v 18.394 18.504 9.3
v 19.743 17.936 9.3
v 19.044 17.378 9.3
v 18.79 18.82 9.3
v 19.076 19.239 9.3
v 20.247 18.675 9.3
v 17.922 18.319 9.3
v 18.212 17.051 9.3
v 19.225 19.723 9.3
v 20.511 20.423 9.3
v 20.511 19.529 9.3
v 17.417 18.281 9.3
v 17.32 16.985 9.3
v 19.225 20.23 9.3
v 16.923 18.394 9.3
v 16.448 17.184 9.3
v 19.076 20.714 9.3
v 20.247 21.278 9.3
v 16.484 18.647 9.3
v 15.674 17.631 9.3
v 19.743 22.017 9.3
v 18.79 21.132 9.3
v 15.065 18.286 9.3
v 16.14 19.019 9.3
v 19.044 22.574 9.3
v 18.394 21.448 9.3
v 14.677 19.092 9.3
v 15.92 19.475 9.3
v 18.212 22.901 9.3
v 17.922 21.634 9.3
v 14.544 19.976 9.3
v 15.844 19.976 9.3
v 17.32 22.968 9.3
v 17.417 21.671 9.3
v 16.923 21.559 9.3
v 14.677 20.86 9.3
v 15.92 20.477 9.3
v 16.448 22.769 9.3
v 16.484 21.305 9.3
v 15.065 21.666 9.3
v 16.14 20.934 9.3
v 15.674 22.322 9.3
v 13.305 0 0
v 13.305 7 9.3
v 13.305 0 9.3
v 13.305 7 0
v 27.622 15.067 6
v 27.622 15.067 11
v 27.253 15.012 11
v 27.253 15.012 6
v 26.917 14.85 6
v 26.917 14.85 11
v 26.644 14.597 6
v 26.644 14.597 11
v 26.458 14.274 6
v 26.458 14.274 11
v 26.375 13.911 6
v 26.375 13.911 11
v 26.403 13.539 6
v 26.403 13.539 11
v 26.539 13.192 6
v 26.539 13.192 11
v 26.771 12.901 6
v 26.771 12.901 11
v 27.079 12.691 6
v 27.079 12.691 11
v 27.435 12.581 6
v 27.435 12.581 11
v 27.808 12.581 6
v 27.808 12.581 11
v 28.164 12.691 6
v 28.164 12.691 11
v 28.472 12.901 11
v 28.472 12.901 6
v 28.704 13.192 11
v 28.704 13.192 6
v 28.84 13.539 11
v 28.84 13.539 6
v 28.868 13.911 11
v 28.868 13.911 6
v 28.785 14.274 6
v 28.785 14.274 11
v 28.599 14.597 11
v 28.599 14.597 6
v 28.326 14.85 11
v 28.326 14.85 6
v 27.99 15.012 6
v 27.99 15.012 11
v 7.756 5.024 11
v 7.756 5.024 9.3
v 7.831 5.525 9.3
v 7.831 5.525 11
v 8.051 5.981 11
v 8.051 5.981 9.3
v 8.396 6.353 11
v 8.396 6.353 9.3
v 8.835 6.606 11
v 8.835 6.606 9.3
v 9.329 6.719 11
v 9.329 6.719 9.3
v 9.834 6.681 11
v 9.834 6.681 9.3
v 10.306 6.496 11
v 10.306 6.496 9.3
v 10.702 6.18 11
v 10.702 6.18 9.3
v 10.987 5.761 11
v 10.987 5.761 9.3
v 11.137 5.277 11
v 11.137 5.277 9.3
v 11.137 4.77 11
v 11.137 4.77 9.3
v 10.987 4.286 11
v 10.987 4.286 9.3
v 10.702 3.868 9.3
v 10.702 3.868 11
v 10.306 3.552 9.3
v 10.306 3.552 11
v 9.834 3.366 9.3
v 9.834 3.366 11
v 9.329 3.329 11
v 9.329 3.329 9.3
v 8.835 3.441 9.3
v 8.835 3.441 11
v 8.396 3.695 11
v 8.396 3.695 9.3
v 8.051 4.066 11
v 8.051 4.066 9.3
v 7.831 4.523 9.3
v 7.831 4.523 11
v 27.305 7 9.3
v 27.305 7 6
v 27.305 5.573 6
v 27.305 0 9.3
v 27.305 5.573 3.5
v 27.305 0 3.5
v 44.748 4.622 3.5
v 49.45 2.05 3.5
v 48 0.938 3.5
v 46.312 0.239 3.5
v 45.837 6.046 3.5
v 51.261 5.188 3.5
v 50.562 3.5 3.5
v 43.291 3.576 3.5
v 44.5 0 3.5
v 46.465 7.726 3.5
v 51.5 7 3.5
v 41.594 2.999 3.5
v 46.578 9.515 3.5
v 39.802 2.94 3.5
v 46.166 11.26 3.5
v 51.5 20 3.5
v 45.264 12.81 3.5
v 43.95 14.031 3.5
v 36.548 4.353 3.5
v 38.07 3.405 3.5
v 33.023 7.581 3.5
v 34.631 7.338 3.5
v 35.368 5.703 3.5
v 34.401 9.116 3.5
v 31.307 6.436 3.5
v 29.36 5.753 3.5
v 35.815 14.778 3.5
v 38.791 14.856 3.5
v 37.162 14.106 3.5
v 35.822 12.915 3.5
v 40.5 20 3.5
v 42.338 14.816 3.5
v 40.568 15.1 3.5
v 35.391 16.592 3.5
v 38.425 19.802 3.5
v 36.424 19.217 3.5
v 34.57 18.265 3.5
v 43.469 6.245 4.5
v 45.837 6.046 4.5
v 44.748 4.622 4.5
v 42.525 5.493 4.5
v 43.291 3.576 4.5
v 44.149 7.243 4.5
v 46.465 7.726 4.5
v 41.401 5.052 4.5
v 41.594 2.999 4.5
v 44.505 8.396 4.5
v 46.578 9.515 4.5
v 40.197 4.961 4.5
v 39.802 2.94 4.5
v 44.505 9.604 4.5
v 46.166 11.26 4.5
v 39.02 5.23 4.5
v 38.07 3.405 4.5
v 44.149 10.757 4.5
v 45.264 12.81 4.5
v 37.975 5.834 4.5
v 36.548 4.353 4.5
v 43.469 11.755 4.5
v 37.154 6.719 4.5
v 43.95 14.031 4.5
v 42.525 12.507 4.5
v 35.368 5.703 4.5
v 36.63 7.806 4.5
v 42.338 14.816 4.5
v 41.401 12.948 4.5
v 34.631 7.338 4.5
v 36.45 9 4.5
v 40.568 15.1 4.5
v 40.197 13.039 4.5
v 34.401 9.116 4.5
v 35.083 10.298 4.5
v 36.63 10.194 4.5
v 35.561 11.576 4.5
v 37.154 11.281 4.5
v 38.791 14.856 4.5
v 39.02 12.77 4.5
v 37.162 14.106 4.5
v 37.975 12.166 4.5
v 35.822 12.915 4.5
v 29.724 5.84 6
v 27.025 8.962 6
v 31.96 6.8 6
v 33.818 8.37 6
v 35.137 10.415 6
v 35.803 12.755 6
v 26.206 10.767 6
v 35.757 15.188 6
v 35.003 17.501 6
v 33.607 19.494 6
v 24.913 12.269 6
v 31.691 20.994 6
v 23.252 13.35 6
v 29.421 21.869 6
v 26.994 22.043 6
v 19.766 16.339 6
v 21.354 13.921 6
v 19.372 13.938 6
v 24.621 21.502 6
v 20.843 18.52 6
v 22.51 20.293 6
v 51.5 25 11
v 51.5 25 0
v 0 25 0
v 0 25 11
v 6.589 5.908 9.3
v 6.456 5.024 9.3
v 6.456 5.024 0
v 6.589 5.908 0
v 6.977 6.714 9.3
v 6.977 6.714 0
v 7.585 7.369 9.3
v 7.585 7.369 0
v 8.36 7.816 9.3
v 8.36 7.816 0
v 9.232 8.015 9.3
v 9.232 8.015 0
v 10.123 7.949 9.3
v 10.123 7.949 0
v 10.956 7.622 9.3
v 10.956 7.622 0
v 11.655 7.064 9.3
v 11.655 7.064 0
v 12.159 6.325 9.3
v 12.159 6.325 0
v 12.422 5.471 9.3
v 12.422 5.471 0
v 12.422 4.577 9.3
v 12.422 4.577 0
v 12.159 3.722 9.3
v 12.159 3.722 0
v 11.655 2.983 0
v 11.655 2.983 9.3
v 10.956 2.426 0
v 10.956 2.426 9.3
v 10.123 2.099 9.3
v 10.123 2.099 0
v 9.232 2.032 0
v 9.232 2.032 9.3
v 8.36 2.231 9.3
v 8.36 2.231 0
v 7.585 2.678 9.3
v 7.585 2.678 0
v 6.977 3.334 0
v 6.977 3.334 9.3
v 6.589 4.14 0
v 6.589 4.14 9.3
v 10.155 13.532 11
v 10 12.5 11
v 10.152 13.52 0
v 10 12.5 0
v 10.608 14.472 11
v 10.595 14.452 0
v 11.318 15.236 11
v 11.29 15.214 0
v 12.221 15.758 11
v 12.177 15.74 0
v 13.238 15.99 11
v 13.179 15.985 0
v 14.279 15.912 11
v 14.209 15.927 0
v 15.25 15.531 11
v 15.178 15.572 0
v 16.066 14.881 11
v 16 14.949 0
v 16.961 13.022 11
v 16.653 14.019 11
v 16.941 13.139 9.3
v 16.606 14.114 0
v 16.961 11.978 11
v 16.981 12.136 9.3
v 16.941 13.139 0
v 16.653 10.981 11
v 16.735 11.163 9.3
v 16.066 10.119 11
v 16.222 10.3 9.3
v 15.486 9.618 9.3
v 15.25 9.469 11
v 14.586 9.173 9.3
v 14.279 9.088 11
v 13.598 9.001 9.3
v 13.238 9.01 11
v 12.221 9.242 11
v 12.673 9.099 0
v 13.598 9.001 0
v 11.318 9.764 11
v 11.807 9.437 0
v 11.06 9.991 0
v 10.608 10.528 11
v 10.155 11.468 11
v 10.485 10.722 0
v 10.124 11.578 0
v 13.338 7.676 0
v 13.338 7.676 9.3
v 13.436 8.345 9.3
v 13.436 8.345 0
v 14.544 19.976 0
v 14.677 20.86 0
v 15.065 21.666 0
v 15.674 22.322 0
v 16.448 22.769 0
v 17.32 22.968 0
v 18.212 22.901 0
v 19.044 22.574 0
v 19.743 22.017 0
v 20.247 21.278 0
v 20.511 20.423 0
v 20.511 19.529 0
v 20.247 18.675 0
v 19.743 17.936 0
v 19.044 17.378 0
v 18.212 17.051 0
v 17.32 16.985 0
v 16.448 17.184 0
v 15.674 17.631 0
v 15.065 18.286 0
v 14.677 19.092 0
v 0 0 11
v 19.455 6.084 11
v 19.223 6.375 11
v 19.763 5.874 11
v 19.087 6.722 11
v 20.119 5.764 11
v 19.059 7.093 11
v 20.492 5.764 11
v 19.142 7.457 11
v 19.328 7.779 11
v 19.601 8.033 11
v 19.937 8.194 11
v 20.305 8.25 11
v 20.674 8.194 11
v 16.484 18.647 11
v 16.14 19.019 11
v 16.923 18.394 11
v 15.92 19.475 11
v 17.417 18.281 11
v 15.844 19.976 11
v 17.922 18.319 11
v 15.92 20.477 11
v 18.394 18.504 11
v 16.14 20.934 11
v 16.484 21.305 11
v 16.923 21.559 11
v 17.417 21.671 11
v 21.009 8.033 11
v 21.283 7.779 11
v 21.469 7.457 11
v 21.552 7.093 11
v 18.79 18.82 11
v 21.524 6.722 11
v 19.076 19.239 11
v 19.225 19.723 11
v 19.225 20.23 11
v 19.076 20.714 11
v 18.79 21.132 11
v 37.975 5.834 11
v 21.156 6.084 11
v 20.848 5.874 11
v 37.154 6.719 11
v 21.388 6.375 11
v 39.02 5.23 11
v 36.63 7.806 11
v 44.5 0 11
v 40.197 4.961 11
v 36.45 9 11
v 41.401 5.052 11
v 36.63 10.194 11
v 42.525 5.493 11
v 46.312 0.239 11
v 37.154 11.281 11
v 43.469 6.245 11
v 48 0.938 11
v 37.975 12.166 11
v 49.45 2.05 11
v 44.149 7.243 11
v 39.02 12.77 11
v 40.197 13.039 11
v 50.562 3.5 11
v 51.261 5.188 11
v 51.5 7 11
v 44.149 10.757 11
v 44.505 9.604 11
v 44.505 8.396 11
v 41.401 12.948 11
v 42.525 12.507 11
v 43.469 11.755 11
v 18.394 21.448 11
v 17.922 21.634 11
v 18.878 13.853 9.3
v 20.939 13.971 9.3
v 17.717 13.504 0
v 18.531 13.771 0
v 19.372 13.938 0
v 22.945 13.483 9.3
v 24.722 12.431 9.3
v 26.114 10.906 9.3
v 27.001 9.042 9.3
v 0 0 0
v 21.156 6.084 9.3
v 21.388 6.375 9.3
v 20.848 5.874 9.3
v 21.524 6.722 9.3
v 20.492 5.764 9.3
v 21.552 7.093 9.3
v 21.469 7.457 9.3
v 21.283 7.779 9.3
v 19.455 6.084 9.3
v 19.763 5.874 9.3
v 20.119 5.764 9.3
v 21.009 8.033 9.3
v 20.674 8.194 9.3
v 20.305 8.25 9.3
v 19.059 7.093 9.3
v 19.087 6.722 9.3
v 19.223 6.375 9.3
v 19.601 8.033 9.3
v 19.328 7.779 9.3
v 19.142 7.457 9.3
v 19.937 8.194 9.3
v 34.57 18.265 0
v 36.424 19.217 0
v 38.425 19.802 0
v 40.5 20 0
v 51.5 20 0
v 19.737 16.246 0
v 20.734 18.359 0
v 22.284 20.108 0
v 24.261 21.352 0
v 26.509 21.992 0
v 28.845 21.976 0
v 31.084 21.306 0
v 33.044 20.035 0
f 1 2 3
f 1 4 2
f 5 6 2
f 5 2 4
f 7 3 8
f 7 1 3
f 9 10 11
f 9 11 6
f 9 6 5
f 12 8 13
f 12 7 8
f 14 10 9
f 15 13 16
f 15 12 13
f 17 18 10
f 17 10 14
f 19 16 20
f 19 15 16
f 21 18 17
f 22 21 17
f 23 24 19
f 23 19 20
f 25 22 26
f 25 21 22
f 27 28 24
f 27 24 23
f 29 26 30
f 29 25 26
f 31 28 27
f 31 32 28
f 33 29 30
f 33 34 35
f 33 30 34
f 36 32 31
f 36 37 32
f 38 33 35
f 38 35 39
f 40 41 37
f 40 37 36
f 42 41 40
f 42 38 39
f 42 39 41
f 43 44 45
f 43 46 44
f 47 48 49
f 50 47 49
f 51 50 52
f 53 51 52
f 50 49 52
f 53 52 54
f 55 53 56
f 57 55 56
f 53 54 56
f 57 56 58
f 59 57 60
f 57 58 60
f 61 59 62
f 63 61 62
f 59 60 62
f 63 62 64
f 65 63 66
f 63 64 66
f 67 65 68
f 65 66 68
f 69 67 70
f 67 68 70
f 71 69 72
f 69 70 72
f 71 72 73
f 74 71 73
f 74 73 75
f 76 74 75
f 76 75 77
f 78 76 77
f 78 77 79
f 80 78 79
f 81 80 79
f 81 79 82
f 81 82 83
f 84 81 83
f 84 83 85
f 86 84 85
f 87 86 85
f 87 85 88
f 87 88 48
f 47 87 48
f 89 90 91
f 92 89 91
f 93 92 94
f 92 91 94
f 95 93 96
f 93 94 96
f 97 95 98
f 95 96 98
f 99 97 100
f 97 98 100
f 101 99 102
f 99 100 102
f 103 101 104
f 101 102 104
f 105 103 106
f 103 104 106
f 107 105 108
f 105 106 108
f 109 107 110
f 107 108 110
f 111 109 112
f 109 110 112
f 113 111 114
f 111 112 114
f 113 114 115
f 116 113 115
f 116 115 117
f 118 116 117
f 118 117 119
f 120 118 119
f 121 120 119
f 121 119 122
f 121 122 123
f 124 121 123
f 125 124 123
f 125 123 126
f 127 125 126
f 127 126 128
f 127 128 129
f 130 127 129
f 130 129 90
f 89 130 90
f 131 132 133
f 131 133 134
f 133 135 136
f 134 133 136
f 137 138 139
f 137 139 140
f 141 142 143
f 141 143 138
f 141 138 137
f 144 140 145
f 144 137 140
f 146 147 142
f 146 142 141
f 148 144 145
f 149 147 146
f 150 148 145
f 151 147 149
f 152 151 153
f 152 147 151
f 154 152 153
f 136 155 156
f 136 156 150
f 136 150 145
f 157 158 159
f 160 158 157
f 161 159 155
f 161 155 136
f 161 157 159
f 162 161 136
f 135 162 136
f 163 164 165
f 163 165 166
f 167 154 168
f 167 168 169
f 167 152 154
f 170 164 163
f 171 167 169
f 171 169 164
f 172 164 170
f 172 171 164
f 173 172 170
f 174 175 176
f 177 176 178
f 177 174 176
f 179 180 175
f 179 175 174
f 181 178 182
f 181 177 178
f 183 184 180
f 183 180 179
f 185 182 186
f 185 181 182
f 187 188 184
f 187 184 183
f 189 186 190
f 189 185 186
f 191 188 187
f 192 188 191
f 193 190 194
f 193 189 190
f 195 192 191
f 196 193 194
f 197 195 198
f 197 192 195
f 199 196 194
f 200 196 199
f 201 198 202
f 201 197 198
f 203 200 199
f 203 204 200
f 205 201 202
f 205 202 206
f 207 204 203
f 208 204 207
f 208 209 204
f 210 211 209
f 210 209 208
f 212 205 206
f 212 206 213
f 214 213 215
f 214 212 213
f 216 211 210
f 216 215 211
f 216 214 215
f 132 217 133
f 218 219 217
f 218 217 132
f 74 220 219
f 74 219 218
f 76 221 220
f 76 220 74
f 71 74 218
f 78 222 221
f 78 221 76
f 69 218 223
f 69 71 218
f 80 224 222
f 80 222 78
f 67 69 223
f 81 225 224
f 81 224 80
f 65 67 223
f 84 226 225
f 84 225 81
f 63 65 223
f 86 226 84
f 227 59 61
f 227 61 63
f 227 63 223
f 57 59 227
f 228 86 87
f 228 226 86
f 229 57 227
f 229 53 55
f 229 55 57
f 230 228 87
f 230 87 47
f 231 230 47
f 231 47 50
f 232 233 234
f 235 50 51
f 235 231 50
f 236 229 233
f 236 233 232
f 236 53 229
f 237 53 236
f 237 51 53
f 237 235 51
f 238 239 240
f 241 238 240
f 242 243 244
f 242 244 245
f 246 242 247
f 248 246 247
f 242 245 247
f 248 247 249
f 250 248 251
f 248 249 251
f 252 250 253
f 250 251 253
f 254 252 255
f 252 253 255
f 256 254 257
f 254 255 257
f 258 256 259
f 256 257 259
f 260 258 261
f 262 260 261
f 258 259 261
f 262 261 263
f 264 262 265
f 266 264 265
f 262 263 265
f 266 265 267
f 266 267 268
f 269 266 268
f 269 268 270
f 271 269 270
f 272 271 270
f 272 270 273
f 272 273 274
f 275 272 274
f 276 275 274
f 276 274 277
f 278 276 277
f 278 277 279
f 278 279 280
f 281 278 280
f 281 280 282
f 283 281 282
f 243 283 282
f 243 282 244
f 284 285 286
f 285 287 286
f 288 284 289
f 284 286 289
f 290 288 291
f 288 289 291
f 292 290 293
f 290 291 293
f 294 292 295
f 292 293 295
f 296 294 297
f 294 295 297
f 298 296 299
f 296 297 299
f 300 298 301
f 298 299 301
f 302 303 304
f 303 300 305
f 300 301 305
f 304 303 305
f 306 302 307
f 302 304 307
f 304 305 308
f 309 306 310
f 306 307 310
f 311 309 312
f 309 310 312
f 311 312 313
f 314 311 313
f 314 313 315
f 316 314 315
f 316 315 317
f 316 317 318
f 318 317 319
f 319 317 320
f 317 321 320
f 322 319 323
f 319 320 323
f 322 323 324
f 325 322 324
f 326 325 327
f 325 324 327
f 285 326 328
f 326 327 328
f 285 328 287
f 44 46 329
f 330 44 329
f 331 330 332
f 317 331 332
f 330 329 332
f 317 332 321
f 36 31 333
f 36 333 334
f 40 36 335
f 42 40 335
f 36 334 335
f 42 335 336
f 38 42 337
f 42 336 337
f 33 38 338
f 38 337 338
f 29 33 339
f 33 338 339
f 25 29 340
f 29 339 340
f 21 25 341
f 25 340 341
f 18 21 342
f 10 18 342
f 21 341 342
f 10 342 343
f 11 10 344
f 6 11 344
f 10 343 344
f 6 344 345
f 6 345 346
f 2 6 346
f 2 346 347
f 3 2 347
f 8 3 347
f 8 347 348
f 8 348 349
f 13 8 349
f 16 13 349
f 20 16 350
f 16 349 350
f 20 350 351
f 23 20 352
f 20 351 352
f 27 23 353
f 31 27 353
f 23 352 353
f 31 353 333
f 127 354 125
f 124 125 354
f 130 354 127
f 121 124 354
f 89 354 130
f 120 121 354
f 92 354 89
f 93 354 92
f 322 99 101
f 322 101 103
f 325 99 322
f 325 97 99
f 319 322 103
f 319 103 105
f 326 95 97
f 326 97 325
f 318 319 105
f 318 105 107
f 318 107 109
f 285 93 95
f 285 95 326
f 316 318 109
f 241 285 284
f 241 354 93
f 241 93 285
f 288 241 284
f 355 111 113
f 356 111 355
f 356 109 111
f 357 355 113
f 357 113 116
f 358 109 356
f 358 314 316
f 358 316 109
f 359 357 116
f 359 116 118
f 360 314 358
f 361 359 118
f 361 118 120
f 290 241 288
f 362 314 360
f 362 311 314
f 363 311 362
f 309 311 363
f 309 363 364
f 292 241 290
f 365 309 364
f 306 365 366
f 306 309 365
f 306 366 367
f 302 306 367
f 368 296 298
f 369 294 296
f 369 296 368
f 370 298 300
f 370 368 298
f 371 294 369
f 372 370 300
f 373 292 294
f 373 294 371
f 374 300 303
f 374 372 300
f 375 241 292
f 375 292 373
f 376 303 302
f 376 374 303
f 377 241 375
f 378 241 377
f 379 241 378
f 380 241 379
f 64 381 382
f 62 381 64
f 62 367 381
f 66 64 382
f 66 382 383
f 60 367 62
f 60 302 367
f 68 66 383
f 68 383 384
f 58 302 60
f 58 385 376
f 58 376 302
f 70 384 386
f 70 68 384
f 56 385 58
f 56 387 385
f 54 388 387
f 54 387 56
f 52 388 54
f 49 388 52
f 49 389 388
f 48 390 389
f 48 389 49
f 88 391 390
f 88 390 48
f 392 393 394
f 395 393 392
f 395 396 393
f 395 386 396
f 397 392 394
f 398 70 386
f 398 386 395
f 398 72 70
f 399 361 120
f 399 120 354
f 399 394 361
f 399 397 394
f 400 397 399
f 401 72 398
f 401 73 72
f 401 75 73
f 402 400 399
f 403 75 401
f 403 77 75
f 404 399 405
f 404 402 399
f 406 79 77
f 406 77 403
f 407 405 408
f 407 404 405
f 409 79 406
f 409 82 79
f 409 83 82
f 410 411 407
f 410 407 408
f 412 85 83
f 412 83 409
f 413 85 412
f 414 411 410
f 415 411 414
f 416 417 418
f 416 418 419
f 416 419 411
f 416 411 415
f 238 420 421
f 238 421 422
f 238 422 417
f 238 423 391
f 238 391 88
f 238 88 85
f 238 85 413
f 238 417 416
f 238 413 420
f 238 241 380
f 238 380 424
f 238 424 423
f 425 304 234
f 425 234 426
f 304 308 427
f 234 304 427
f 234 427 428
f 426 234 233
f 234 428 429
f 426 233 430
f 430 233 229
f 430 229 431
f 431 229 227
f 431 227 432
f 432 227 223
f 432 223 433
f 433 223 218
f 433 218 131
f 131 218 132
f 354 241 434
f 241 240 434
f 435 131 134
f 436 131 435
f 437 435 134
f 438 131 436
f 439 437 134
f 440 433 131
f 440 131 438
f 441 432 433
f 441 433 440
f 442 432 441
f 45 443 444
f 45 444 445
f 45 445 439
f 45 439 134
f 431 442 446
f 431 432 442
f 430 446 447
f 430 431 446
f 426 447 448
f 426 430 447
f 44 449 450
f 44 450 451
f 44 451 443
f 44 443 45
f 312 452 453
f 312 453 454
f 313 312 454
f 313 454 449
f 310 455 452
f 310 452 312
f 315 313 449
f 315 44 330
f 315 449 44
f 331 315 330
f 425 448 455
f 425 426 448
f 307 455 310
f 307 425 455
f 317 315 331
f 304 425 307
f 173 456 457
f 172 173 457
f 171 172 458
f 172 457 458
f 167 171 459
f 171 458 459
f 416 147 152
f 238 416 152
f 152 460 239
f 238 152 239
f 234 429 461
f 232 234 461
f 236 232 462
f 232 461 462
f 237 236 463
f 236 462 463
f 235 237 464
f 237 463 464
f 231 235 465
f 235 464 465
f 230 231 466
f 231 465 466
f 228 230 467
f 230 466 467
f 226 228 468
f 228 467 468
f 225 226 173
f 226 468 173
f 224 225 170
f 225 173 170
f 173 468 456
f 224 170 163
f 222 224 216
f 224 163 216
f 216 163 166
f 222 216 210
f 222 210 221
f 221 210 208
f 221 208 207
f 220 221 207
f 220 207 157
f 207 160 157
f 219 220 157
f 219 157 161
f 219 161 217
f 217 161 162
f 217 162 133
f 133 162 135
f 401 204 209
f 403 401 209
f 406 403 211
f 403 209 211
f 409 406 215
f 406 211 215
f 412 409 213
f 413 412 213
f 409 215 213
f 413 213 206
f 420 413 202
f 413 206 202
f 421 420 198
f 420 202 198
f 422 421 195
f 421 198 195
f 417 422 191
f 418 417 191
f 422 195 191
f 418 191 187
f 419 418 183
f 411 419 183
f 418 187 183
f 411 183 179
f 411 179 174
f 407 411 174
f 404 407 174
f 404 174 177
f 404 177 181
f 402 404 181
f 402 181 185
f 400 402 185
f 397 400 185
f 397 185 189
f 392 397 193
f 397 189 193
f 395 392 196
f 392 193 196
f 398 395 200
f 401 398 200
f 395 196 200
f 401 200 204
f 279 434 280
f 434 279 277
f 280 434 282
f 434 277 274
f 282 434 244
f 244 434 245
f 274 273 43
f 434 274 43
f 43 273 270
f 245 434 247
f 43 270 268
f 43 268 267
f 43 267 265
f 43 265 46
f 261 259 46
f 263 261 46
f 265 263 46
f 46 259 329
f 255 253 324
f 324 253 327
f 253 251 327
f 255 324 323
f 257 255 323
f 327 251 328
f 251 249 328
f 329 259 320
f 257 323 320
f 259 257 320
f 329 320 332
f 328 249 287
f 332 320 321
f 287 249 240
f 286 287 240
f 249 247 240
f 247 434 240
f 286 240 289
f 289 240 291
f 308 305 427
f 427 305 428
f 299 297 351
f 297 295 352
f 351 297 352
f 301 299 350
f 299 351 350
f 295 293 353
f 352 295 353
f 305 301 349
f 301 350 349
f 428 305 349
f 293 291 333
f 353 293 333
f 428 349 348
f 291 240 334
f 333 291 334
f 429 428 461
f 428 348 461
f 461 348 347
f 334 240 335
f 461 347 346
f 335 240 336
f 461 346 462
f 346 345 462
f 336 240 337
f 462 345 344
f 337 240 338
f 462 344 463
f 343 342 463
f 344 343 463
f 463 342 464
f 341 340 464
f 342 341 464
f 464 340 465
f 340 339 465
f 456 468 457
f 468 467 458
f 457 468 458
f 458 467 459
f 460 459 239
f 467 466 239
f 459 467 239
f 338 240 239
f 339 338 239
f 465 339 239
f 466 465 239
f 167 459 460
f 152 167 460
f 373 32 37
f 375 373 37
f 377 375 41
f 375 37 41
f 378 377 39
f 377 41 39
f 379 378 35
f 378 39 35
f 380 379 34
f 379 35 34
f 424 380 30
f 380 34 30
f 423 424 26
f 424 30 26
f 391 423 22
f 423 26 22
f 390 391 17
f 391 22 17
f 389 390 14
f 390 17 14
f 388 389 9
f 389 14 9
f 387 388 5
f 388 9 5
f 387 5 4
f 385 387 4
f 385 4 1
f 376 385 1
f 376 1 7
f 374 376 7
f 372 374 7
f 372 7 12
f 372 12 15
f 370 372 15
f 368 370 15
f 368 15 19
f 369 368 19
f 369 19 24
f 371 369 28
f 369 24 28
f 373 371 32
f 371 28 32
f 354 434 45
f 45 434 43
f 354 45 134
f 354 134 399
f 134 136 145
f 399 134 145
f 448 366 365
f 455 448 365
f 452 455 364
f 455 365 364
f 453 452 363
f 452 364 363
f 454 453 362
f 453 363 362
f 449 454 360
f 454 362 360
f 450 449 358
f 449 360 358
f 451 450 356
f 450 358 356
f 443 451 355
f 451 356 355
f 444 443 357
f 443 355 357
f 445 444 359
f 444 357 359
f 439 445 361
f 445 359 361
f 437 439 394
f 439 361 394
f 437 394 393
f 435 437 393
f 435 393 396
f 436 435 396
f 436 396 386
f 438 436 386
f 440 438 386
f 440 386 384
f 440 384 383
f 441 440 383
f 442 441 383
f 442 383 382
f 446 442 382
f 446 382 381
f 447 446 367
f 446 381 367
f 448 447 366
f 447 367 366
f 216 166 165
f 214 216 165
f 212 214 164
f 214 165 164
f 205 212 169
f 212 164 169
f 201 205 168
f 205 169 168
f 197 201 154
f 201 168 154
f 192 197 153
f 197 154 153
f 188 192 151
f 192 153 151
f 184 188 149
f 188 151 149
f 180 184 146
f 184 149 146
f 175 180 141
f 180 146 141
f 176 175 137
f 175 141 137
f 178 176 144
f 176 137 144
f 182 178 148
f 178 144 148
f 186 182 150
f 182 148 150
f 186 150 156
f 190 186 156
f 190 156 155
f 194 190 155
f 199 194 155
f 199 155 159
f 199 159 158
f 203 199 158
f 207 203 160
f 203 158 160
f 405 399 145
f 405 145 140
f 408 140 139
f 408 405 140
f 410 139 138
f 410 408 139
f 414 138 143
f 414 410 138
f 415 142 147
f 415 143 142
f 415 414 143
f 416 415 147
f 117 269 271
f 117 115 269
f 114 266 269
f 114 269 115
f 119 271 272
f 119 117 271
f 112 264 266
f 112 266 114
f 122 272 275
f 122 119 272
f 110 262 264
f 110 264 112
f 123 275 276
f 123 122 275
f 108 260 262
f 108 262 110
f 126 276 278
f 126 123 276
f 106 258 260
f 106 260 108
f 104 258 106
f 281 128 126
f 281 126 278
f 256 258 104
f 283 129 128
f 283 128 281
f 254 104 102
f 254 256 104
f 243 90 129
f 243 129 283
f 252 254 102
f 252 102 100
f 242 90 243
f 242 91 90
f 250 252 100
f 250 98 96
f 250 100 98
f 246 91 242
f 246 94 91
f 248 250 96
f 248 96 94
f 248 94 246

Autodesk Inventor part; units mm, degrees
ref_plane "YZ Plane" through (0, 0, 0) normal (1, 0, 0) x (0, 1, 0)
ref_plane "XZ Plane" through (0, 0, 0) normal (0, 1, 0) x (-1, 0, 0)
ref_plane "XY Plane" through (0, 0, 0) normal (0, 0, 1) x (1, 0, 0)
sketch "Sketch1" plane through (0, 0, 0) normal (0, 0, 1) x (1, 0, 0)
  line L0 (51.5, 25) -> (0, 25)
  line L1 (0, 25) -> (0, 0)
  line L2 (0, 0) -> (51.5, 0)
  line L3 (51.5, 0) -> (51.5, 25)
  point P0 (0, 12.5)
  dimension "d85" = 25
  dimension "d86" = 51.5
extrude "Bryla" add sketch "Sketch1" along normal blind 11
sketch "Sketch3" plane through (0, 0, 0) normal (0, 0, -1) x (-1, 0, 0)
  circle A0 centre (-13.5, 12.5) radius 3.5
  circle A1 centre (-20.3053, 7) radius 7
  circle A2 centre (-27.6215, 13.8172) radius 8.25
  circle A3 centre (-40.5, 9) radius 11
  circle A4 centre (-40.5, 9) radius 4.05
  circle A5 centre (-40.5, 9) radius 6.1
  line L0 (-13.5, 12.5) -> (-20.3053, 7) construction
  line L1 (-20.3053, 7) -> (-27.6215, 13.8172) construction
  line L2 (-27.6215, 13.8172) -> (-40.5, 9) construction
  line L3 (-17.5442, 19.9762) -> (-9.4558, 5.0238) construction
  circle A6 centre (-9.4558, 5.0238) radius 1.7
  circle A7 centre (-17.5442, 19.9762) radius 1.7
  circle A8 centre (-17.5442, 19.9762) radius 3
  circle A9 centre (-9.4558, 5.0238) radius 3
  line L4 (0, 0) -> (-51.5, 0) construction
  line L5 (-40.5, 20) -> (-51.5, 20)
  line L6 (-51.5, 20) -> (-51.5, 0)
  line L7 (0, 0) -> (-51.5, 0)
  line L8 (-46.8246, 0) -> (-51.5, 0)
  line L9 (-34.1754, 0) -> (-29.5, 0)
  line L10 (-29.5, 0) -> (-29.5, 9)
  line L11 (-27.3053, 7) -> (-27.3053, 0)
  line L12 (-13.3053, 7) -> (-13.3053, 0)
  line L13 (-29.5, 0) -> (-27.3053, 0)
  line L14 (-35.8715, 13.8172) -> (-35.8715, 0)
  line L15 (-51.5, 0) -> (0, 0) construction
  line L16 (0, 0) -> (0, 25) construction
  line L17 (0, 0) -> (-51.5, 0) construction
  line L18 (0, 25) -> (0, 0) construction
  line L19 (0, 25) -> (0, 0) construction
  line L20 (0, 0) -> (-51.5, 0) construction
  line L21 (-51.5, 25) -> (0, 25) construction
  line L22 (-51.5, 0) -> (-51.5, 25) construction
  line L23 (0, 0) -> (-51.5, 0) construction
  line L24 (0, 0) -> (-51.5, 0) construction
  point P0 (-34.4011, 9.1163)
  point P1 (-35.822, 12.9148)
  point P2 (-27.1598, 5.5801)
  point P3 (-22.8938, 18.8508)
  point P4 (-29.9455, 5.9013)
  point P5 (-23.4992, 20.9635)
  point P6 (-19.82, 16.5003)
  point P7 (-34.57, 18.2647)
  point P8 (-20.5208, 12.676)
  point P9 (-19.3723, 13.9375)
  point P10 (-23.9846, 12.9551)
  point P11 (-16.7322, 13.0194)
  point P12 (-1.1315, 7.6691)
  point P13 (-16.5069, 14.2913)
  point P14 (-10.2995, 13.9166)
  point P15 (-16.9412, 13.1386)
  point P16 (-6.1553, 9.4162)
  point P17 (-15.1313, 21.7589)
  point P18 (-16.1793, 22.6477)
  point P19 (-13.5975, 9.0014)
  point P20 (-29.5, 0)
  point P21 (-27.6754, 0)
  point P22 (-20.3053, 0)
  point P23 (-34.1754, 0)
  point P24 (-27.3053, 5.5733)
  point P25 (-29.5, 5.7839)
  point P26 (-51.5, 9)
  dimension "d20" = 7
  dimension "d21" = 14
  dimension "d22" = 16.5
  dimension "d23" = 22
  dimension "d24" = 12.2
  dimension "d25" = 8.1
  dimension "d26" = 8.75
  dimension "d27" = 10
  dimension "d28" = 13.75
  dimension "d59" = 6
  dimension "d60" = 3.4
  dimension "d61" = 17
  dimension "d66" = 12.5
  dimension "d69" = 9
  dimension "d83" = 13.5
  dimension "d87" = 11
extrude "Przelot" cut sketch "Sketch3" against normal through all contours A0 A1 | A1 A0 | A4 | A6 | A7
extrude "kolo3" cut sketch "Sketch3" against normal blind 3.5 contours A1 A0 | A3 A2 A5 | A2 L14 A5 L7 A3 | L11 L7 L10 A2 | A2 A5 L14 | L10 A2 A3 | A3 L6 L5 | L10 L7 A3 A2 | A5 A2 | A2 A5 L14 | L14 A5 | A3 L7 L14 A5 A2 | A3 L7 L6 | A3 L7 | A4 picked at (-14.968, 10.5481)
extrude "kolo1" cut sketch "Sketch3" against normal blind 9.3 contours A0 A1 | A1 A0 | A0 A1 A2 | A2 A1 | L12 L7 A1 | A1 A2 L11 | L7 L11 A2 A1
extrude "kolo2" cut sketch "Sketch3" against normal blind 6 contours A2 A1 | A1 L11 A2 L10 A3 | A1 A2 L11 | A3 A2 A5 | L10 A2 A3 | A5 A2
hole "osieMale" at (27.6215, 13.8172, 0) at (20.3053, 7, 0) direction (0, 0, 1) diameter 2.5 end through all
extrude "kolnierzLozyska" cut sketch "Sketch3" against normal blind 1 from surface at -3.5 contours A2 A5 L14 | L14 A5 picked at (-35.5053, 8.9668)
extrude "lbySrob" cut sketch "Sketch3" against normal up to surface (9.3 mm away) contours A6 | A7 | A8 | A9
fillet "Fillet1" radius 7 1 edges at (51.5, 0, 7.25)
properties part number "MocowaniePrzekladni_3DPrint"
